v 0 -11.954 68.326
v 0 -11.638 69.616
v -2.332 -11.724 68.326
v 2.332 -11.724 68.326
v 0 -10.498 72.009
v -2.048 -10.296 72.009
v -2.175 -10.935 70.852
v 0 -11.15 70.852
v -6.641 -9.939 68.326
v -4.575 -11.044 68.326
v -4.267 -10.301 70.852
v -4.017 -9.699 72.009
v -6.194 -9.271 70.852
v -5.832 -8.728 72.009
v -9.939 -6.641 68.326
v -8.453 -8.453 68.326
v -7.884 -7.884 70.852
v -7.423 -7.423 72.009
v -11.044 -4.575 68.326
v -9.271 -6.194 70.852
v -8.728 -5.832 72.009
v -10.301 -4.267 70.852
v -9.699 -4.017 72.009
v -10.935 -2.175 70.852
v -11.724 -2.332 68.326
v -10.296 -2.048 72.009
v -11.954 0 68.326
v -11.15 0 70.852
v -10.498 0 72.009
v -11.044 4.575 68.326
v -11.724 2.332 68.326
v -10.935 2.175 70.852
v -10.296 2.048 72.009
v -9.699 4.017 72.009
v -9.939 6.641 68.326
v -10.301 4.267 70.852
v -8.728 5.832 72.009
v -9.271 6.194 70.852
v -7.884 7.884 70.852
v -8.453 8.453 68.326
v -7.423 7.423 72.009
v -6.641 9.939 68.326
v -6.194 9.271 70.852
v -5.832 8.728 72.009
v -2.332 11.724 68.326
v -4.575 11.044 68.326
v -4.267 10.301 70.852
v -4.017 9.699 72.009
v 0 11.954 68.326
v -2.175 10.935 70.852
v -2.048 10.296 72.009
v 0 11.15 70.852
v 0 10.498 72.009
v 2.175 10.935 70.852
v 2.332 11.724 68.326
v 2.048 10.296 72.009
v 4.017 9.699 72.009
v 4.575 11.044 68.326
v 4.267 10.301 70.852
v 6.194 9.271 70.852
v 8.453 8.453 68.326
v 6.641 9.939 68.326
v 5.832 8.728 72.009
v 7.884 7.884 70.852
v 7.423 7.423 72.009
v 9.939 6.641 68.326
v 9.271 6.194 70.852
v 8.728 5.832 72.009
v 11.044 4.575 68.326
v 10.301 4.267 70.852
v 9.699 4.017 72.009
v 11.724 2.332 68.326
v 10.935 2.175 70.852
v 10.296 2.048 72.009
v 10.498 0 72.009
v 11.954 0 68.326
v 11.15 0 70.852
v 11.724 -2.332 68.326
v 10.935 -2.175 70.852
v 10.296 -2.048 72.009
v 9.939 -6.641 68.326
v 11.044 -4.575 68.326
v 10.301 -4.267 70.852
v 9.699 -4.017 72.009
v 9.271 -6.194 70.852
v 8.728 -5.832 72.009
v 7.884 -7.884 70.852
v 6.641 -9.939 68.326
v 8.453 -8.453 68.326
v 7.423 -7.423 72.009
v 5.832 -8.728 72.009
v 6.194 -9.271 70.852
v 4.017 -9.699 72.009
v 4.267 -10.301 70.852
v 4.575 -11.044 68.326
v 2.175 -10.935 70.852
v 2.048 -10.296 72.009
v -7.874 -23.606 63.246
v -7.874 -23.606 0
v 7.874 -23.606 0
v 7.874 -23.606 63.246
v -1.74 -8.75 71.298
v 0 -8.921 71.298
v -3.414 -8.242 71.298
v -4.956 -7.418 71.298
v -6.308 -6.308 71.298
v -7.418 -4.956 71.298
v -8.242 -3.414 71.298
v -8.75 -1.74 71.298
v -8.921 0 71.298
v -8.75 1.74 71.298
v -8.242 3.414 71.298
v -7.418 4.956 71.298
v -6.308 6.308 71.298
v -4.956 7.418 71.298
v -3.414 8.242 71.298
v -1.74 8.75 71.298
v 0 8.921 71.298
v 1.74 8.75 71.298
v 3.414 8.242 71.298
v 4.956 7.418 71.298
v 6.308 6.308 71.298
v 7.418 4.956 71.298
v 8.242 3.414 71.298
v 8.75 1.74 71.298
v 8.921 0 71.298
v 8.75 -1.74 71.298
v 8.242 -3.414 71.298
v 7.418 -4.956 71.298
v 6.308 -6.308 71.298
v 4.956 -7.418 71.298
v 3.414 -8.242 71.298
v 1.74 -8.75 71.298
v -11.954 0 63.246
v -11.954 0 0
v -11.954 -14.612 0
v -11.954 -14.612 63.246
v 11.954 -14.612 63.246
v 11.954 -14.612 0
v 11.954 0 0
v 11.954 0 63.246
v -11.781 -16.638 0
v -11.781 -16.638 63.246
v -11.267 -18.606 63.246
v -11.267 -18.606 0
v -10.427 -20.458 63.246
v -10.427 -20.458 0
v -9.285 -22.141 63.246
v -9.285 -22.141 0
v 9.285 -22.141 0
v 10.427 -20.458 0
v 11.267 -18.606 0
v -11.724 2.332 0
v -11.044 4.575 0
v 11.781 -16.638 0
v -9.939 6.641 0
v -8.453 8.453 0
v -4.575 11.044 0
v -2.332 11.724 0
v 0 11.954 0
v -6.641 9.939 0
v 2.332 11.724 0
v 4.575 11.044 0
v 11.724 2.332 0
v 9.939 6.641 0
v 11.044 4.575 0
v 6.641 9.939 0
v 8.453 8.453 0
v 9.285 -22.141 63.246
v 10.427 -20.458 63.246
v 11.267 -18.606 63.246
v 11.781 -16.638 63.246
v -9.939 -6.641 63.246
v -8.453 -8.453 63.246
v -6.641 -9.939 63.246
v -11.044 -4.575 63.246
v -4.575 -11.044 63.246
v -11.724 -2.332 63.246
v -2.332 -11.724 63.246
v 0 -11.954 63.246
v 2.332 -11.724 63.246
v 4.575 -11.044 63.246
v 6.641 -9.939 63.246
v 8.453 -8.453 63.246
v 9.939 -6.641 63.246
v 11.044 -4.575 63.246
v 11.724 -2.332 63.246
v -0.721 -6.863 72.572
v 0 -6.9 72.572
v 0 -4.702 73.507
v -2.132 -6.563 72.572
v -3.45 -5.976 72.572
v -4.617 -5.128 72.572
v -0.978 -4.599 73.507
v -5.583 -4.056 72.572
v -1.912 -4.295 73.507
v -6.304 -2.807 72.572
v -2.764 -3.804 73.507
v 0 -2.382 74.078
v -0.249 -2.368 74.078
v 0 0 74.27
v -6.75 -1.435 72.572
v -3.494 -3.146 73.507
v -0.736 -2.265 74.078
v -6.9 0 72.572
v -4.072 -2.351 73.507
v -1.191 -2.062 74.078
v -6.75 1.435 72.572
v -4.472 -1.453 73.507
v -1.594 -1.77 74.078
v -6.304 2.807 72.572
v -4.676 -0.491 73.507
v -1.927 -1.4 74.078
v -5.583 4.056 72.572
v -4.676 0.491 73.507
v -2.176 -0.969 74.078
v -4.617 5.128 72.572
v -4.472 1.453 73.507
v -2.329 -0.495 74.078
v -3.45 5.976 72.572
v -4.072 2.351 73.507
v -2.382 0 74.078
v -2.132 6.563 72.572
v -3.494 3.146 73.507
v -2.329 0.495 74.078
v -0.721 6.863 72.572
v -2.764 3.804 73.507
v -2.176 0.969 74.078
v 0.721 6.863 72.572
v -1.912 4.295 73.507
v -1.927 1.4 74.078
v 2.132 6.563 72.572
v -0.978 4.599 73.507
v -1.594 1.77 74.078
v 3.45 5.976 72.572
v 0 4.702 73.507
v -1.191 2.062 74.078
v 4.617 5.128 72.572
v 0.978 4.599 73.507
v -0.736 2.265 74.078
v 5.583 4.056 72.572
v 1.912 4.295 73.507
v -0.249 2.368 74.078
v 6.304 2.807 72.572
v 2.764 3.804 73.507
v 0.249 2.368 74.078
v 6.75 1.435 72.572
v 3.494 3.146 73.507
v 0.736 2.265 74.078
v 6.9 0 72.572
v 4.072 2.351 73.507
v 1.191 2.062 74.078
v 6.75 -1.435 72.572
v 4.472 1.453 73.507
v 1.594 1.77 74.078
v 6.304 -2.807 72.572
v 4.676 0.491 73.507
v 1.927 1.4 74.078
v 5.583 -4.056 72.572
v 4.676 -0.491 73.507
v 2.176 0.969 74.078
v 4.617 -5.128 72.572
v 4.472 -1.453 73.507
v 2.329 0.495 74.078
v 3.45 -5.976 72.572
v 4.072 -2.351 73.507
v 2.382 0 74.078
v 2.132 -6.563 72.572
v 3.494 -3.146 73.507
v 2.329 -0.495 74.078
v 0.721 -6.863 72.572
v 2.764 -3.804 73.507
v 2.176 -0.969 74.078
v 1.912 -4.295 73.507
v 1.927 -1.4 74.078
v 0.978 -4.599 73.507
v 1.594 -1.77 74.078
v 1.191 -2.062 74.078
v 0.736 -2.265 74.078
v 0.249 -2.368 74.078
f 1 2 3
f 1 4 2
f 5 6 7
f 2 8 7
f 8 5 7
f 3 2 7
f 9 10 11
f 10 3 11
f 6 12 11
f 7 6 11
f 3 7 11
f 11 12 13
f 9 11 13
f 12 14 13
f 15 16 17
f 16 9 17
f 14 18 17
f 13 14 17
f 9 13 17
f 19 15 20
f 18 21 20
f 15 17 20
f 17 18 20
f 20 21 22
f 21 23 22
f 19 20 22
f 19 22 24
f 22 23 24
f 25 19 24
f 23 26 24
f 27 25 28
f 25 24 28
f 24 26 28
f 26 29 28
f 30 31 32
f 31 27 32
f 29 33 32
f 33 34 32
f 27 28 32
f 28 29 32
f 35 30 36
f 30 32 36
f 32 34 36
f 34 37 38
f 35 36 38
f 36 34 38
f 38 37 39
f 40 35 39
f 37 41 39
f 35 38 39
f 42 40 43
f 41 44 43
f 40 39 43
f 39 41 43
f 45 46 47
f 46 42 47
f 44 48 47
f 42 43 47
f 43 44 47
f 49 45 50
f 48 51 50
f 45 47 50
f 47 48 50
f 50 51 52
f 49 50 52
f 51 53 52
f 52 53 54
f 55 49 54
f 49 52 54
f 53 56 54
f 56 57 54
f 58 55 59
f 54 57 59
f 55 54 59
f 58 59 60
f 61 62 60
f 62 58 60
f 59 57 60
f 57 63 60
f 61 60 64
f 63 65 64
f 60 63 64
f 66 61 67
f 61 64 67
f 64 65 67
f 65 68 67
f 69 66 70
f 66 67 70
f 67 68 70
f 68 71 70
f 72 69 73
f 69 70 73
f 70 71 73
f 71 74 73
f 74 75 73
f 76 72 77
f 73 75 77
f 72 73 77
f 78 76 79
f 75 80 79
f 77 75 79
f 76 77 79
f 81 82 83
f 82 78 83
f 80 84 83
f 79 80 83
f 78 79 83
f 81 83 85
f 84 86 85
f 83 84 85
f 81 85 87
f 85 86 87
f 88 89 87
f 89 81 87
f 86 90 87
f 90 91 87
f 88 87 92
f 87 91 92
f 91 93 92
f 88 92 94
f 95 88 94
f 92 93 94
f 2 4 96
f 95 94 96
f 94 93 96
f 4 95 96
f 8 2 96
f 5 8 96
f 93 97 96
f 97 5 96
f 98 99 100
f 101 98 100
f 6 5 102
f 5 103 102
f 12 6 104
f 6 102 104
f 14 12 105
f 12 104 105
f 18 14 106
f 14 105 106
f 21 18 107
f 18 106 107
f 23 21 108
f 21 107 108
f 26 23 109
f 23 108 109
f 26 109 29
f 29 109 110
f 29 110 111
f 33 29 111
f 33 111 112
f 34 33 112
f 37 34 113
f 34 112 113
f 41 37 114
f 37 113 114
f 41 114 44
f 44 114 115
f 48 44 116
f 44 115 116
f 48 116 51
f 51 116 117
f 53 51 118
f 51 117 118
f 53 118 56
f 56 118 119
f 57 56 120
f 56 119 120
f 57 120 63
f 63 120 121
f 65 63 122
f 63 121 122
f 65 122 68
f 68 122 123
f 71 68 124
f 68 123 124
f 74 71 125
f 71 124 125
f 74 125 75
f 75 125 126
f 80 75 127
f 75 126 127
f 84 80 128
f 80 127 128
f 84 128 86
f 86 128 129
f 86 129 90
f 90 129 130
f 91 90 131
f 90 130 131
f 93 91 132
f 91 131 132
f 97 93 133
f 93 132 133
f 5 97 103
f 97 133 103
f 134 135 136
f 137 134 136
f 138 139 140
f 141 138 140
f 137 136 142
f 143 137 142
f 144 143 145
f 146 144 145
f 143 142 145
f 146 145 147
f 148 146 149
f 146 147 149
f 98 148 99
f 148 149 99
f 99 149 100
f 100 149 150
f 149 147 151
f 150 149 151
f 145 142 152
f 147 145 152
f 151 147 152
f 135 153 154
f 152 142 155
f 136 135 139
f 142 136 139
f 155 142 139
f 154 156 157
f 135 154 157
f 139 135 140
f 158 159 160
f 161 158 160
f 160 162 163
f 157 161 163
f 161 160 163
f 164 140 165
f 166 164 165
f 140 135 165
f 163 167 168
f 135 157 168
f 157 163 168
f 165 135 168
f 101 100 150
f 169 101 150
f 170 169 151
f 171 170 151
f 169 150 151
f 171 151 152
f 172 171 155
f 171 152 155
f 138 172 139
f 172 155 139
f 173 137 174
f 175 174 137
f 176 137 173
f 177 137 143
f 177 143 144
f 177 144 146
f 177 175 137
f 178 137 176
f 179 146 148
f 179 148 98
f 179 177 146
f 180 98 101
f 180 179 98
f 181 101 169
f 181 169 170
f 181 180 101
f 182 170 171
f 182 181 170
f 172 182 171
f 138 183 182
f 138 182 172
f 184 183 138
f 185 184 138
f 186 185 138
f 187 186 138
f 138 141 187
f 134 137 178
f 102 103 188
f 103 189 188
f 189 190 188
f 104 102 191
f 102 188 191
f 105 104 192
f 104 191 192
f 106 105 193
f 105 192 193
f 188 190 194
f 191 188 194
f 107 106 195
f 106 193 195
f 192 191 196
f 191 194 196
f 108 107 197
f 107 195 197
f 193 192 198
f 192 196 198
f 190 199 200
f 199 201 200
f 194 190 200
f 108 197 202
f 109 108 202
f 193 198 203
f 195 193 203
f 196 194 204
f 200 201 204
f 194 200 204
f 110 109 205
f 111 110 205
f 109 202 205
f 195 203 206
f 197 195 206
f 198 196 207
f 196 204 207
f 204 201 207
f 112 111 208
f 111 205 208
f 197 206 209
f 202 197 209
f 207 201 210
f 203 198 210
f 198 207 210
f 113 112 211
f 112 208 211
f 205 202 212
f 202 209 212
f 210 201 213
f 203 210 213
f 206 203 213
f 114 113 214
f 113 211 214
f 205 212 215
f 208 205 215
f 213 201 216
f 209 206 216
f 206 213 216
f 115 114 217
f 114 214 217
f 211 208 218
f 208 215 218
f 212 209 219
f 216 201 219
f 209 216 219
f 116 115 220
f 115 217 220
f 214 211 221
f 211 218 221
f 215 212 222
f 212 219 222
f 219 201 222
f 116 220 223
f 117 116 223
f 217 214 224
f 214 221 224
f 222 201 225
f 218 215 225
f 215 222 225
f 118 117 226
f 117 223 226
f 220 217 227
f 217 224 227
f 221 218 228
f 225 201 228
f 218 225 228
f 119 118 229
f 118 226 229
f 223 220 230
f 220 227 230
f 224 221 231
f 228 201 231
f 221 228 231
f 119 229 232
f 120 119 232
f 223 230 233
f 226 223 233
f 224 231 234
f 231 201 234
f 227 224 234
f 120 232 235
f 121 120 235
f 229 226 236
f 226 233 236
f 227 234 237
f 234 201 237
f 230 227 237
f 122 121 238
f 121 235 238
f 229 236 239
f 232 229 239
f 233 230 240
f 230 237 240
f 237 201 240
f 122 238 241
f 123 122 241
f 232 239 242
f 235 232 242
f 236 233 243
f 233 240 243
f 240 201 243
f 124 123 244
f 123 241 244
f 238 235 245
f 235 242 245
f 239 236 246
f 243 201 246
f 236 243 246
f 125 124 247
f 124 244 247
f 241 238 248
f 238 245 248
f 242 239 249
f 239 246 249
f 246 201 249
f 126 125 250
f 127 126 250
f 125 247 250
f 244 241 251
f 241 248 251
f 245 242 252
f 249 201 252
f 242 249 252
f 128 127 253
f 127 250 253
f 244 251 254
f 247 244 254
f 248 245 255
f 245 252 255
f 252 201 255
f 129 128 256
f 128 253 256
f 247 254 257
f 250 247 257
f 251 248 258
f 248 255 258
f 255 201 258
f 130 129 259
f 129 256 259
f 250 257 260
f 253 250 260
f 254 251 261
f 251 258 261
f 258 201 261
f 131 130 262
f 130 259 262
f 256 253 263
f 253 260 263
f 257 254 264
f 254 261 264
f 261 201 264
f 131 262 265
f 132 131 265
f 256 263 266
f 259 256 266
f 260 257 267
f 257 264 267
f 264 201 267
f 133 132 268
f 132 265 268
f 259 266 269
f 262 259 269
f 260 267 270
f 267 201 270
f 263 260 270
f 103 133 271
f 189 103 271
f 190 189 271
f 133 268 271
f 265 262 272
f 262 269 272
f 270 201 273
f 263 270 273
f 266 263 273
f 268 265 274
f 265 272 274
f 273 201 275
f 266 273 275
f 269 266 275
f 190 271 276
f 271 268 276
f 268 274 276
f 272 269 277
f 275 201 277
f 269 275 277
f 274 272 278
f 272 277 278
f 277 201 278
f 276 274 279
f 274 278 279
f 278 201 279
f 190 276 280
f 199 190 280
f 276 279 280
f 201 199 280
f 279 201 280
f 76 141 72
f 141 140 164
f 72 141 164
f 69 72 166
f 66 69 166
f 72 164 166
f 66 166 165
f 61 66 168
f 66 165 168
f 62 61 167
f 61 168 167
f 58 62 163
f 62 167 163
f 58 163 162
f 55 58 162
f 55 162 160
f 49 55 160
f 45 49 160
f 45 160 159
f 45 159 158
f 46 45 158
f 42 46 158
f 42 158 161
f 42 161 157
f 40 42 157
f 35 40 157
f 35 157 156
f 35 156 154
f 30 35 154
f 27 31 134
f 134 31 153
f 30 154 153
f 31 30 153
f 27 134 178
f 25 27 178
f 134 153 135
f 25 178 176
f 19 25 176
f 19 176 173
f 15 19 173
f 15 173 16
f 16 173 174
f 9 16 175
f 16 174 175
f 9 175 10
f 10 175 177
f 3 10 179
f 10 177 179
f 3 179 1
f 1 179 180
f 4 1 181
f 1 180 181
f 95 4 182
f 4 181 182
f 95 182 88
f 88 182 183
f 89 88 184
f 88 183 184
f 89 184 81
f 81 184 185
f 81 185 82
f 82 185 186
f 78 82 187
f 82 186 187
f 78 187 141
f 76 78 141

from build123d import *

# Parameters (mm, degrees)
BOSS_EXTRUDE1_DEPTH = 63.246
SKETCH2_R           = 11.953875
BOSS_EXTRUDE2_DEPTH = 5.08


with BuildPart() as part:
    # Sketch1 → Boss-Extrude1 (new body)
    with BuildSketch(Plane.XY):
        with BuildLine():
            Line((-7.874, -23.606125), (7.874, -23.606125))
            ThreePointArc((7.874, -23.606125), (10.886228439, -19.550079279), (11.953875, -14.611946243))
            Line((11.953875, -14.611946243), (11.953875, 0))
            ThreePointArc((11.953875, 0), (0, 11.953875), (-11.953875, 0))
            Line((-11.953875, 0), (-11.953875, -14.611946243))
            ThreePointArc((-11.953875, -14.611946243), (-10.886228439, -19.550079279), (-7.874, -23.606125))
        make_face()
    extrude(amount=BOSS_EXTRUDE1_DEPTH)

    # Sketch2 → Boss-Extrude2 (add)
    with BuildSketch(Plane.XY.offset(63.246)):
        Circle(SKETCH2_R)
    extrude(amount=BOSS_EXTRUDE2_DEPTH)

    # Sketch3 → Revolve1 (revolve)
    with BuildSketch(Plane(origin=(0, 0, 0), x_dir=(0, 0, -1), z_dir=(1, 0, 0)), mode=Mode.PRIVATE) as revolve1_sk:
        with BuildLine():
            Line((-74.2696, 0), (-68.326, 0))
            Line((-68.326, 0), (-68.326, 11.953875))
            ThreePointArc((-68.326, 11.953875), (-70.242328664, 11.415006517), (-72.009, 10.49763681))
            Line((-72.009, 10.49763681), (-71.2978, 8.921350892))
            ThreePointArc((-71.2978, 8.921350892), (-73.507109881, 4.701651225), (-74.2696, 0))
        make_face()
    revolve(revolve1_sk.sketch.rotate(Axis((0, 0, 74.2696), (0, 0, -1)), 180), axis=Axis((0, 0, 74.2696), (0, 0, -1)))


solid = part.part
